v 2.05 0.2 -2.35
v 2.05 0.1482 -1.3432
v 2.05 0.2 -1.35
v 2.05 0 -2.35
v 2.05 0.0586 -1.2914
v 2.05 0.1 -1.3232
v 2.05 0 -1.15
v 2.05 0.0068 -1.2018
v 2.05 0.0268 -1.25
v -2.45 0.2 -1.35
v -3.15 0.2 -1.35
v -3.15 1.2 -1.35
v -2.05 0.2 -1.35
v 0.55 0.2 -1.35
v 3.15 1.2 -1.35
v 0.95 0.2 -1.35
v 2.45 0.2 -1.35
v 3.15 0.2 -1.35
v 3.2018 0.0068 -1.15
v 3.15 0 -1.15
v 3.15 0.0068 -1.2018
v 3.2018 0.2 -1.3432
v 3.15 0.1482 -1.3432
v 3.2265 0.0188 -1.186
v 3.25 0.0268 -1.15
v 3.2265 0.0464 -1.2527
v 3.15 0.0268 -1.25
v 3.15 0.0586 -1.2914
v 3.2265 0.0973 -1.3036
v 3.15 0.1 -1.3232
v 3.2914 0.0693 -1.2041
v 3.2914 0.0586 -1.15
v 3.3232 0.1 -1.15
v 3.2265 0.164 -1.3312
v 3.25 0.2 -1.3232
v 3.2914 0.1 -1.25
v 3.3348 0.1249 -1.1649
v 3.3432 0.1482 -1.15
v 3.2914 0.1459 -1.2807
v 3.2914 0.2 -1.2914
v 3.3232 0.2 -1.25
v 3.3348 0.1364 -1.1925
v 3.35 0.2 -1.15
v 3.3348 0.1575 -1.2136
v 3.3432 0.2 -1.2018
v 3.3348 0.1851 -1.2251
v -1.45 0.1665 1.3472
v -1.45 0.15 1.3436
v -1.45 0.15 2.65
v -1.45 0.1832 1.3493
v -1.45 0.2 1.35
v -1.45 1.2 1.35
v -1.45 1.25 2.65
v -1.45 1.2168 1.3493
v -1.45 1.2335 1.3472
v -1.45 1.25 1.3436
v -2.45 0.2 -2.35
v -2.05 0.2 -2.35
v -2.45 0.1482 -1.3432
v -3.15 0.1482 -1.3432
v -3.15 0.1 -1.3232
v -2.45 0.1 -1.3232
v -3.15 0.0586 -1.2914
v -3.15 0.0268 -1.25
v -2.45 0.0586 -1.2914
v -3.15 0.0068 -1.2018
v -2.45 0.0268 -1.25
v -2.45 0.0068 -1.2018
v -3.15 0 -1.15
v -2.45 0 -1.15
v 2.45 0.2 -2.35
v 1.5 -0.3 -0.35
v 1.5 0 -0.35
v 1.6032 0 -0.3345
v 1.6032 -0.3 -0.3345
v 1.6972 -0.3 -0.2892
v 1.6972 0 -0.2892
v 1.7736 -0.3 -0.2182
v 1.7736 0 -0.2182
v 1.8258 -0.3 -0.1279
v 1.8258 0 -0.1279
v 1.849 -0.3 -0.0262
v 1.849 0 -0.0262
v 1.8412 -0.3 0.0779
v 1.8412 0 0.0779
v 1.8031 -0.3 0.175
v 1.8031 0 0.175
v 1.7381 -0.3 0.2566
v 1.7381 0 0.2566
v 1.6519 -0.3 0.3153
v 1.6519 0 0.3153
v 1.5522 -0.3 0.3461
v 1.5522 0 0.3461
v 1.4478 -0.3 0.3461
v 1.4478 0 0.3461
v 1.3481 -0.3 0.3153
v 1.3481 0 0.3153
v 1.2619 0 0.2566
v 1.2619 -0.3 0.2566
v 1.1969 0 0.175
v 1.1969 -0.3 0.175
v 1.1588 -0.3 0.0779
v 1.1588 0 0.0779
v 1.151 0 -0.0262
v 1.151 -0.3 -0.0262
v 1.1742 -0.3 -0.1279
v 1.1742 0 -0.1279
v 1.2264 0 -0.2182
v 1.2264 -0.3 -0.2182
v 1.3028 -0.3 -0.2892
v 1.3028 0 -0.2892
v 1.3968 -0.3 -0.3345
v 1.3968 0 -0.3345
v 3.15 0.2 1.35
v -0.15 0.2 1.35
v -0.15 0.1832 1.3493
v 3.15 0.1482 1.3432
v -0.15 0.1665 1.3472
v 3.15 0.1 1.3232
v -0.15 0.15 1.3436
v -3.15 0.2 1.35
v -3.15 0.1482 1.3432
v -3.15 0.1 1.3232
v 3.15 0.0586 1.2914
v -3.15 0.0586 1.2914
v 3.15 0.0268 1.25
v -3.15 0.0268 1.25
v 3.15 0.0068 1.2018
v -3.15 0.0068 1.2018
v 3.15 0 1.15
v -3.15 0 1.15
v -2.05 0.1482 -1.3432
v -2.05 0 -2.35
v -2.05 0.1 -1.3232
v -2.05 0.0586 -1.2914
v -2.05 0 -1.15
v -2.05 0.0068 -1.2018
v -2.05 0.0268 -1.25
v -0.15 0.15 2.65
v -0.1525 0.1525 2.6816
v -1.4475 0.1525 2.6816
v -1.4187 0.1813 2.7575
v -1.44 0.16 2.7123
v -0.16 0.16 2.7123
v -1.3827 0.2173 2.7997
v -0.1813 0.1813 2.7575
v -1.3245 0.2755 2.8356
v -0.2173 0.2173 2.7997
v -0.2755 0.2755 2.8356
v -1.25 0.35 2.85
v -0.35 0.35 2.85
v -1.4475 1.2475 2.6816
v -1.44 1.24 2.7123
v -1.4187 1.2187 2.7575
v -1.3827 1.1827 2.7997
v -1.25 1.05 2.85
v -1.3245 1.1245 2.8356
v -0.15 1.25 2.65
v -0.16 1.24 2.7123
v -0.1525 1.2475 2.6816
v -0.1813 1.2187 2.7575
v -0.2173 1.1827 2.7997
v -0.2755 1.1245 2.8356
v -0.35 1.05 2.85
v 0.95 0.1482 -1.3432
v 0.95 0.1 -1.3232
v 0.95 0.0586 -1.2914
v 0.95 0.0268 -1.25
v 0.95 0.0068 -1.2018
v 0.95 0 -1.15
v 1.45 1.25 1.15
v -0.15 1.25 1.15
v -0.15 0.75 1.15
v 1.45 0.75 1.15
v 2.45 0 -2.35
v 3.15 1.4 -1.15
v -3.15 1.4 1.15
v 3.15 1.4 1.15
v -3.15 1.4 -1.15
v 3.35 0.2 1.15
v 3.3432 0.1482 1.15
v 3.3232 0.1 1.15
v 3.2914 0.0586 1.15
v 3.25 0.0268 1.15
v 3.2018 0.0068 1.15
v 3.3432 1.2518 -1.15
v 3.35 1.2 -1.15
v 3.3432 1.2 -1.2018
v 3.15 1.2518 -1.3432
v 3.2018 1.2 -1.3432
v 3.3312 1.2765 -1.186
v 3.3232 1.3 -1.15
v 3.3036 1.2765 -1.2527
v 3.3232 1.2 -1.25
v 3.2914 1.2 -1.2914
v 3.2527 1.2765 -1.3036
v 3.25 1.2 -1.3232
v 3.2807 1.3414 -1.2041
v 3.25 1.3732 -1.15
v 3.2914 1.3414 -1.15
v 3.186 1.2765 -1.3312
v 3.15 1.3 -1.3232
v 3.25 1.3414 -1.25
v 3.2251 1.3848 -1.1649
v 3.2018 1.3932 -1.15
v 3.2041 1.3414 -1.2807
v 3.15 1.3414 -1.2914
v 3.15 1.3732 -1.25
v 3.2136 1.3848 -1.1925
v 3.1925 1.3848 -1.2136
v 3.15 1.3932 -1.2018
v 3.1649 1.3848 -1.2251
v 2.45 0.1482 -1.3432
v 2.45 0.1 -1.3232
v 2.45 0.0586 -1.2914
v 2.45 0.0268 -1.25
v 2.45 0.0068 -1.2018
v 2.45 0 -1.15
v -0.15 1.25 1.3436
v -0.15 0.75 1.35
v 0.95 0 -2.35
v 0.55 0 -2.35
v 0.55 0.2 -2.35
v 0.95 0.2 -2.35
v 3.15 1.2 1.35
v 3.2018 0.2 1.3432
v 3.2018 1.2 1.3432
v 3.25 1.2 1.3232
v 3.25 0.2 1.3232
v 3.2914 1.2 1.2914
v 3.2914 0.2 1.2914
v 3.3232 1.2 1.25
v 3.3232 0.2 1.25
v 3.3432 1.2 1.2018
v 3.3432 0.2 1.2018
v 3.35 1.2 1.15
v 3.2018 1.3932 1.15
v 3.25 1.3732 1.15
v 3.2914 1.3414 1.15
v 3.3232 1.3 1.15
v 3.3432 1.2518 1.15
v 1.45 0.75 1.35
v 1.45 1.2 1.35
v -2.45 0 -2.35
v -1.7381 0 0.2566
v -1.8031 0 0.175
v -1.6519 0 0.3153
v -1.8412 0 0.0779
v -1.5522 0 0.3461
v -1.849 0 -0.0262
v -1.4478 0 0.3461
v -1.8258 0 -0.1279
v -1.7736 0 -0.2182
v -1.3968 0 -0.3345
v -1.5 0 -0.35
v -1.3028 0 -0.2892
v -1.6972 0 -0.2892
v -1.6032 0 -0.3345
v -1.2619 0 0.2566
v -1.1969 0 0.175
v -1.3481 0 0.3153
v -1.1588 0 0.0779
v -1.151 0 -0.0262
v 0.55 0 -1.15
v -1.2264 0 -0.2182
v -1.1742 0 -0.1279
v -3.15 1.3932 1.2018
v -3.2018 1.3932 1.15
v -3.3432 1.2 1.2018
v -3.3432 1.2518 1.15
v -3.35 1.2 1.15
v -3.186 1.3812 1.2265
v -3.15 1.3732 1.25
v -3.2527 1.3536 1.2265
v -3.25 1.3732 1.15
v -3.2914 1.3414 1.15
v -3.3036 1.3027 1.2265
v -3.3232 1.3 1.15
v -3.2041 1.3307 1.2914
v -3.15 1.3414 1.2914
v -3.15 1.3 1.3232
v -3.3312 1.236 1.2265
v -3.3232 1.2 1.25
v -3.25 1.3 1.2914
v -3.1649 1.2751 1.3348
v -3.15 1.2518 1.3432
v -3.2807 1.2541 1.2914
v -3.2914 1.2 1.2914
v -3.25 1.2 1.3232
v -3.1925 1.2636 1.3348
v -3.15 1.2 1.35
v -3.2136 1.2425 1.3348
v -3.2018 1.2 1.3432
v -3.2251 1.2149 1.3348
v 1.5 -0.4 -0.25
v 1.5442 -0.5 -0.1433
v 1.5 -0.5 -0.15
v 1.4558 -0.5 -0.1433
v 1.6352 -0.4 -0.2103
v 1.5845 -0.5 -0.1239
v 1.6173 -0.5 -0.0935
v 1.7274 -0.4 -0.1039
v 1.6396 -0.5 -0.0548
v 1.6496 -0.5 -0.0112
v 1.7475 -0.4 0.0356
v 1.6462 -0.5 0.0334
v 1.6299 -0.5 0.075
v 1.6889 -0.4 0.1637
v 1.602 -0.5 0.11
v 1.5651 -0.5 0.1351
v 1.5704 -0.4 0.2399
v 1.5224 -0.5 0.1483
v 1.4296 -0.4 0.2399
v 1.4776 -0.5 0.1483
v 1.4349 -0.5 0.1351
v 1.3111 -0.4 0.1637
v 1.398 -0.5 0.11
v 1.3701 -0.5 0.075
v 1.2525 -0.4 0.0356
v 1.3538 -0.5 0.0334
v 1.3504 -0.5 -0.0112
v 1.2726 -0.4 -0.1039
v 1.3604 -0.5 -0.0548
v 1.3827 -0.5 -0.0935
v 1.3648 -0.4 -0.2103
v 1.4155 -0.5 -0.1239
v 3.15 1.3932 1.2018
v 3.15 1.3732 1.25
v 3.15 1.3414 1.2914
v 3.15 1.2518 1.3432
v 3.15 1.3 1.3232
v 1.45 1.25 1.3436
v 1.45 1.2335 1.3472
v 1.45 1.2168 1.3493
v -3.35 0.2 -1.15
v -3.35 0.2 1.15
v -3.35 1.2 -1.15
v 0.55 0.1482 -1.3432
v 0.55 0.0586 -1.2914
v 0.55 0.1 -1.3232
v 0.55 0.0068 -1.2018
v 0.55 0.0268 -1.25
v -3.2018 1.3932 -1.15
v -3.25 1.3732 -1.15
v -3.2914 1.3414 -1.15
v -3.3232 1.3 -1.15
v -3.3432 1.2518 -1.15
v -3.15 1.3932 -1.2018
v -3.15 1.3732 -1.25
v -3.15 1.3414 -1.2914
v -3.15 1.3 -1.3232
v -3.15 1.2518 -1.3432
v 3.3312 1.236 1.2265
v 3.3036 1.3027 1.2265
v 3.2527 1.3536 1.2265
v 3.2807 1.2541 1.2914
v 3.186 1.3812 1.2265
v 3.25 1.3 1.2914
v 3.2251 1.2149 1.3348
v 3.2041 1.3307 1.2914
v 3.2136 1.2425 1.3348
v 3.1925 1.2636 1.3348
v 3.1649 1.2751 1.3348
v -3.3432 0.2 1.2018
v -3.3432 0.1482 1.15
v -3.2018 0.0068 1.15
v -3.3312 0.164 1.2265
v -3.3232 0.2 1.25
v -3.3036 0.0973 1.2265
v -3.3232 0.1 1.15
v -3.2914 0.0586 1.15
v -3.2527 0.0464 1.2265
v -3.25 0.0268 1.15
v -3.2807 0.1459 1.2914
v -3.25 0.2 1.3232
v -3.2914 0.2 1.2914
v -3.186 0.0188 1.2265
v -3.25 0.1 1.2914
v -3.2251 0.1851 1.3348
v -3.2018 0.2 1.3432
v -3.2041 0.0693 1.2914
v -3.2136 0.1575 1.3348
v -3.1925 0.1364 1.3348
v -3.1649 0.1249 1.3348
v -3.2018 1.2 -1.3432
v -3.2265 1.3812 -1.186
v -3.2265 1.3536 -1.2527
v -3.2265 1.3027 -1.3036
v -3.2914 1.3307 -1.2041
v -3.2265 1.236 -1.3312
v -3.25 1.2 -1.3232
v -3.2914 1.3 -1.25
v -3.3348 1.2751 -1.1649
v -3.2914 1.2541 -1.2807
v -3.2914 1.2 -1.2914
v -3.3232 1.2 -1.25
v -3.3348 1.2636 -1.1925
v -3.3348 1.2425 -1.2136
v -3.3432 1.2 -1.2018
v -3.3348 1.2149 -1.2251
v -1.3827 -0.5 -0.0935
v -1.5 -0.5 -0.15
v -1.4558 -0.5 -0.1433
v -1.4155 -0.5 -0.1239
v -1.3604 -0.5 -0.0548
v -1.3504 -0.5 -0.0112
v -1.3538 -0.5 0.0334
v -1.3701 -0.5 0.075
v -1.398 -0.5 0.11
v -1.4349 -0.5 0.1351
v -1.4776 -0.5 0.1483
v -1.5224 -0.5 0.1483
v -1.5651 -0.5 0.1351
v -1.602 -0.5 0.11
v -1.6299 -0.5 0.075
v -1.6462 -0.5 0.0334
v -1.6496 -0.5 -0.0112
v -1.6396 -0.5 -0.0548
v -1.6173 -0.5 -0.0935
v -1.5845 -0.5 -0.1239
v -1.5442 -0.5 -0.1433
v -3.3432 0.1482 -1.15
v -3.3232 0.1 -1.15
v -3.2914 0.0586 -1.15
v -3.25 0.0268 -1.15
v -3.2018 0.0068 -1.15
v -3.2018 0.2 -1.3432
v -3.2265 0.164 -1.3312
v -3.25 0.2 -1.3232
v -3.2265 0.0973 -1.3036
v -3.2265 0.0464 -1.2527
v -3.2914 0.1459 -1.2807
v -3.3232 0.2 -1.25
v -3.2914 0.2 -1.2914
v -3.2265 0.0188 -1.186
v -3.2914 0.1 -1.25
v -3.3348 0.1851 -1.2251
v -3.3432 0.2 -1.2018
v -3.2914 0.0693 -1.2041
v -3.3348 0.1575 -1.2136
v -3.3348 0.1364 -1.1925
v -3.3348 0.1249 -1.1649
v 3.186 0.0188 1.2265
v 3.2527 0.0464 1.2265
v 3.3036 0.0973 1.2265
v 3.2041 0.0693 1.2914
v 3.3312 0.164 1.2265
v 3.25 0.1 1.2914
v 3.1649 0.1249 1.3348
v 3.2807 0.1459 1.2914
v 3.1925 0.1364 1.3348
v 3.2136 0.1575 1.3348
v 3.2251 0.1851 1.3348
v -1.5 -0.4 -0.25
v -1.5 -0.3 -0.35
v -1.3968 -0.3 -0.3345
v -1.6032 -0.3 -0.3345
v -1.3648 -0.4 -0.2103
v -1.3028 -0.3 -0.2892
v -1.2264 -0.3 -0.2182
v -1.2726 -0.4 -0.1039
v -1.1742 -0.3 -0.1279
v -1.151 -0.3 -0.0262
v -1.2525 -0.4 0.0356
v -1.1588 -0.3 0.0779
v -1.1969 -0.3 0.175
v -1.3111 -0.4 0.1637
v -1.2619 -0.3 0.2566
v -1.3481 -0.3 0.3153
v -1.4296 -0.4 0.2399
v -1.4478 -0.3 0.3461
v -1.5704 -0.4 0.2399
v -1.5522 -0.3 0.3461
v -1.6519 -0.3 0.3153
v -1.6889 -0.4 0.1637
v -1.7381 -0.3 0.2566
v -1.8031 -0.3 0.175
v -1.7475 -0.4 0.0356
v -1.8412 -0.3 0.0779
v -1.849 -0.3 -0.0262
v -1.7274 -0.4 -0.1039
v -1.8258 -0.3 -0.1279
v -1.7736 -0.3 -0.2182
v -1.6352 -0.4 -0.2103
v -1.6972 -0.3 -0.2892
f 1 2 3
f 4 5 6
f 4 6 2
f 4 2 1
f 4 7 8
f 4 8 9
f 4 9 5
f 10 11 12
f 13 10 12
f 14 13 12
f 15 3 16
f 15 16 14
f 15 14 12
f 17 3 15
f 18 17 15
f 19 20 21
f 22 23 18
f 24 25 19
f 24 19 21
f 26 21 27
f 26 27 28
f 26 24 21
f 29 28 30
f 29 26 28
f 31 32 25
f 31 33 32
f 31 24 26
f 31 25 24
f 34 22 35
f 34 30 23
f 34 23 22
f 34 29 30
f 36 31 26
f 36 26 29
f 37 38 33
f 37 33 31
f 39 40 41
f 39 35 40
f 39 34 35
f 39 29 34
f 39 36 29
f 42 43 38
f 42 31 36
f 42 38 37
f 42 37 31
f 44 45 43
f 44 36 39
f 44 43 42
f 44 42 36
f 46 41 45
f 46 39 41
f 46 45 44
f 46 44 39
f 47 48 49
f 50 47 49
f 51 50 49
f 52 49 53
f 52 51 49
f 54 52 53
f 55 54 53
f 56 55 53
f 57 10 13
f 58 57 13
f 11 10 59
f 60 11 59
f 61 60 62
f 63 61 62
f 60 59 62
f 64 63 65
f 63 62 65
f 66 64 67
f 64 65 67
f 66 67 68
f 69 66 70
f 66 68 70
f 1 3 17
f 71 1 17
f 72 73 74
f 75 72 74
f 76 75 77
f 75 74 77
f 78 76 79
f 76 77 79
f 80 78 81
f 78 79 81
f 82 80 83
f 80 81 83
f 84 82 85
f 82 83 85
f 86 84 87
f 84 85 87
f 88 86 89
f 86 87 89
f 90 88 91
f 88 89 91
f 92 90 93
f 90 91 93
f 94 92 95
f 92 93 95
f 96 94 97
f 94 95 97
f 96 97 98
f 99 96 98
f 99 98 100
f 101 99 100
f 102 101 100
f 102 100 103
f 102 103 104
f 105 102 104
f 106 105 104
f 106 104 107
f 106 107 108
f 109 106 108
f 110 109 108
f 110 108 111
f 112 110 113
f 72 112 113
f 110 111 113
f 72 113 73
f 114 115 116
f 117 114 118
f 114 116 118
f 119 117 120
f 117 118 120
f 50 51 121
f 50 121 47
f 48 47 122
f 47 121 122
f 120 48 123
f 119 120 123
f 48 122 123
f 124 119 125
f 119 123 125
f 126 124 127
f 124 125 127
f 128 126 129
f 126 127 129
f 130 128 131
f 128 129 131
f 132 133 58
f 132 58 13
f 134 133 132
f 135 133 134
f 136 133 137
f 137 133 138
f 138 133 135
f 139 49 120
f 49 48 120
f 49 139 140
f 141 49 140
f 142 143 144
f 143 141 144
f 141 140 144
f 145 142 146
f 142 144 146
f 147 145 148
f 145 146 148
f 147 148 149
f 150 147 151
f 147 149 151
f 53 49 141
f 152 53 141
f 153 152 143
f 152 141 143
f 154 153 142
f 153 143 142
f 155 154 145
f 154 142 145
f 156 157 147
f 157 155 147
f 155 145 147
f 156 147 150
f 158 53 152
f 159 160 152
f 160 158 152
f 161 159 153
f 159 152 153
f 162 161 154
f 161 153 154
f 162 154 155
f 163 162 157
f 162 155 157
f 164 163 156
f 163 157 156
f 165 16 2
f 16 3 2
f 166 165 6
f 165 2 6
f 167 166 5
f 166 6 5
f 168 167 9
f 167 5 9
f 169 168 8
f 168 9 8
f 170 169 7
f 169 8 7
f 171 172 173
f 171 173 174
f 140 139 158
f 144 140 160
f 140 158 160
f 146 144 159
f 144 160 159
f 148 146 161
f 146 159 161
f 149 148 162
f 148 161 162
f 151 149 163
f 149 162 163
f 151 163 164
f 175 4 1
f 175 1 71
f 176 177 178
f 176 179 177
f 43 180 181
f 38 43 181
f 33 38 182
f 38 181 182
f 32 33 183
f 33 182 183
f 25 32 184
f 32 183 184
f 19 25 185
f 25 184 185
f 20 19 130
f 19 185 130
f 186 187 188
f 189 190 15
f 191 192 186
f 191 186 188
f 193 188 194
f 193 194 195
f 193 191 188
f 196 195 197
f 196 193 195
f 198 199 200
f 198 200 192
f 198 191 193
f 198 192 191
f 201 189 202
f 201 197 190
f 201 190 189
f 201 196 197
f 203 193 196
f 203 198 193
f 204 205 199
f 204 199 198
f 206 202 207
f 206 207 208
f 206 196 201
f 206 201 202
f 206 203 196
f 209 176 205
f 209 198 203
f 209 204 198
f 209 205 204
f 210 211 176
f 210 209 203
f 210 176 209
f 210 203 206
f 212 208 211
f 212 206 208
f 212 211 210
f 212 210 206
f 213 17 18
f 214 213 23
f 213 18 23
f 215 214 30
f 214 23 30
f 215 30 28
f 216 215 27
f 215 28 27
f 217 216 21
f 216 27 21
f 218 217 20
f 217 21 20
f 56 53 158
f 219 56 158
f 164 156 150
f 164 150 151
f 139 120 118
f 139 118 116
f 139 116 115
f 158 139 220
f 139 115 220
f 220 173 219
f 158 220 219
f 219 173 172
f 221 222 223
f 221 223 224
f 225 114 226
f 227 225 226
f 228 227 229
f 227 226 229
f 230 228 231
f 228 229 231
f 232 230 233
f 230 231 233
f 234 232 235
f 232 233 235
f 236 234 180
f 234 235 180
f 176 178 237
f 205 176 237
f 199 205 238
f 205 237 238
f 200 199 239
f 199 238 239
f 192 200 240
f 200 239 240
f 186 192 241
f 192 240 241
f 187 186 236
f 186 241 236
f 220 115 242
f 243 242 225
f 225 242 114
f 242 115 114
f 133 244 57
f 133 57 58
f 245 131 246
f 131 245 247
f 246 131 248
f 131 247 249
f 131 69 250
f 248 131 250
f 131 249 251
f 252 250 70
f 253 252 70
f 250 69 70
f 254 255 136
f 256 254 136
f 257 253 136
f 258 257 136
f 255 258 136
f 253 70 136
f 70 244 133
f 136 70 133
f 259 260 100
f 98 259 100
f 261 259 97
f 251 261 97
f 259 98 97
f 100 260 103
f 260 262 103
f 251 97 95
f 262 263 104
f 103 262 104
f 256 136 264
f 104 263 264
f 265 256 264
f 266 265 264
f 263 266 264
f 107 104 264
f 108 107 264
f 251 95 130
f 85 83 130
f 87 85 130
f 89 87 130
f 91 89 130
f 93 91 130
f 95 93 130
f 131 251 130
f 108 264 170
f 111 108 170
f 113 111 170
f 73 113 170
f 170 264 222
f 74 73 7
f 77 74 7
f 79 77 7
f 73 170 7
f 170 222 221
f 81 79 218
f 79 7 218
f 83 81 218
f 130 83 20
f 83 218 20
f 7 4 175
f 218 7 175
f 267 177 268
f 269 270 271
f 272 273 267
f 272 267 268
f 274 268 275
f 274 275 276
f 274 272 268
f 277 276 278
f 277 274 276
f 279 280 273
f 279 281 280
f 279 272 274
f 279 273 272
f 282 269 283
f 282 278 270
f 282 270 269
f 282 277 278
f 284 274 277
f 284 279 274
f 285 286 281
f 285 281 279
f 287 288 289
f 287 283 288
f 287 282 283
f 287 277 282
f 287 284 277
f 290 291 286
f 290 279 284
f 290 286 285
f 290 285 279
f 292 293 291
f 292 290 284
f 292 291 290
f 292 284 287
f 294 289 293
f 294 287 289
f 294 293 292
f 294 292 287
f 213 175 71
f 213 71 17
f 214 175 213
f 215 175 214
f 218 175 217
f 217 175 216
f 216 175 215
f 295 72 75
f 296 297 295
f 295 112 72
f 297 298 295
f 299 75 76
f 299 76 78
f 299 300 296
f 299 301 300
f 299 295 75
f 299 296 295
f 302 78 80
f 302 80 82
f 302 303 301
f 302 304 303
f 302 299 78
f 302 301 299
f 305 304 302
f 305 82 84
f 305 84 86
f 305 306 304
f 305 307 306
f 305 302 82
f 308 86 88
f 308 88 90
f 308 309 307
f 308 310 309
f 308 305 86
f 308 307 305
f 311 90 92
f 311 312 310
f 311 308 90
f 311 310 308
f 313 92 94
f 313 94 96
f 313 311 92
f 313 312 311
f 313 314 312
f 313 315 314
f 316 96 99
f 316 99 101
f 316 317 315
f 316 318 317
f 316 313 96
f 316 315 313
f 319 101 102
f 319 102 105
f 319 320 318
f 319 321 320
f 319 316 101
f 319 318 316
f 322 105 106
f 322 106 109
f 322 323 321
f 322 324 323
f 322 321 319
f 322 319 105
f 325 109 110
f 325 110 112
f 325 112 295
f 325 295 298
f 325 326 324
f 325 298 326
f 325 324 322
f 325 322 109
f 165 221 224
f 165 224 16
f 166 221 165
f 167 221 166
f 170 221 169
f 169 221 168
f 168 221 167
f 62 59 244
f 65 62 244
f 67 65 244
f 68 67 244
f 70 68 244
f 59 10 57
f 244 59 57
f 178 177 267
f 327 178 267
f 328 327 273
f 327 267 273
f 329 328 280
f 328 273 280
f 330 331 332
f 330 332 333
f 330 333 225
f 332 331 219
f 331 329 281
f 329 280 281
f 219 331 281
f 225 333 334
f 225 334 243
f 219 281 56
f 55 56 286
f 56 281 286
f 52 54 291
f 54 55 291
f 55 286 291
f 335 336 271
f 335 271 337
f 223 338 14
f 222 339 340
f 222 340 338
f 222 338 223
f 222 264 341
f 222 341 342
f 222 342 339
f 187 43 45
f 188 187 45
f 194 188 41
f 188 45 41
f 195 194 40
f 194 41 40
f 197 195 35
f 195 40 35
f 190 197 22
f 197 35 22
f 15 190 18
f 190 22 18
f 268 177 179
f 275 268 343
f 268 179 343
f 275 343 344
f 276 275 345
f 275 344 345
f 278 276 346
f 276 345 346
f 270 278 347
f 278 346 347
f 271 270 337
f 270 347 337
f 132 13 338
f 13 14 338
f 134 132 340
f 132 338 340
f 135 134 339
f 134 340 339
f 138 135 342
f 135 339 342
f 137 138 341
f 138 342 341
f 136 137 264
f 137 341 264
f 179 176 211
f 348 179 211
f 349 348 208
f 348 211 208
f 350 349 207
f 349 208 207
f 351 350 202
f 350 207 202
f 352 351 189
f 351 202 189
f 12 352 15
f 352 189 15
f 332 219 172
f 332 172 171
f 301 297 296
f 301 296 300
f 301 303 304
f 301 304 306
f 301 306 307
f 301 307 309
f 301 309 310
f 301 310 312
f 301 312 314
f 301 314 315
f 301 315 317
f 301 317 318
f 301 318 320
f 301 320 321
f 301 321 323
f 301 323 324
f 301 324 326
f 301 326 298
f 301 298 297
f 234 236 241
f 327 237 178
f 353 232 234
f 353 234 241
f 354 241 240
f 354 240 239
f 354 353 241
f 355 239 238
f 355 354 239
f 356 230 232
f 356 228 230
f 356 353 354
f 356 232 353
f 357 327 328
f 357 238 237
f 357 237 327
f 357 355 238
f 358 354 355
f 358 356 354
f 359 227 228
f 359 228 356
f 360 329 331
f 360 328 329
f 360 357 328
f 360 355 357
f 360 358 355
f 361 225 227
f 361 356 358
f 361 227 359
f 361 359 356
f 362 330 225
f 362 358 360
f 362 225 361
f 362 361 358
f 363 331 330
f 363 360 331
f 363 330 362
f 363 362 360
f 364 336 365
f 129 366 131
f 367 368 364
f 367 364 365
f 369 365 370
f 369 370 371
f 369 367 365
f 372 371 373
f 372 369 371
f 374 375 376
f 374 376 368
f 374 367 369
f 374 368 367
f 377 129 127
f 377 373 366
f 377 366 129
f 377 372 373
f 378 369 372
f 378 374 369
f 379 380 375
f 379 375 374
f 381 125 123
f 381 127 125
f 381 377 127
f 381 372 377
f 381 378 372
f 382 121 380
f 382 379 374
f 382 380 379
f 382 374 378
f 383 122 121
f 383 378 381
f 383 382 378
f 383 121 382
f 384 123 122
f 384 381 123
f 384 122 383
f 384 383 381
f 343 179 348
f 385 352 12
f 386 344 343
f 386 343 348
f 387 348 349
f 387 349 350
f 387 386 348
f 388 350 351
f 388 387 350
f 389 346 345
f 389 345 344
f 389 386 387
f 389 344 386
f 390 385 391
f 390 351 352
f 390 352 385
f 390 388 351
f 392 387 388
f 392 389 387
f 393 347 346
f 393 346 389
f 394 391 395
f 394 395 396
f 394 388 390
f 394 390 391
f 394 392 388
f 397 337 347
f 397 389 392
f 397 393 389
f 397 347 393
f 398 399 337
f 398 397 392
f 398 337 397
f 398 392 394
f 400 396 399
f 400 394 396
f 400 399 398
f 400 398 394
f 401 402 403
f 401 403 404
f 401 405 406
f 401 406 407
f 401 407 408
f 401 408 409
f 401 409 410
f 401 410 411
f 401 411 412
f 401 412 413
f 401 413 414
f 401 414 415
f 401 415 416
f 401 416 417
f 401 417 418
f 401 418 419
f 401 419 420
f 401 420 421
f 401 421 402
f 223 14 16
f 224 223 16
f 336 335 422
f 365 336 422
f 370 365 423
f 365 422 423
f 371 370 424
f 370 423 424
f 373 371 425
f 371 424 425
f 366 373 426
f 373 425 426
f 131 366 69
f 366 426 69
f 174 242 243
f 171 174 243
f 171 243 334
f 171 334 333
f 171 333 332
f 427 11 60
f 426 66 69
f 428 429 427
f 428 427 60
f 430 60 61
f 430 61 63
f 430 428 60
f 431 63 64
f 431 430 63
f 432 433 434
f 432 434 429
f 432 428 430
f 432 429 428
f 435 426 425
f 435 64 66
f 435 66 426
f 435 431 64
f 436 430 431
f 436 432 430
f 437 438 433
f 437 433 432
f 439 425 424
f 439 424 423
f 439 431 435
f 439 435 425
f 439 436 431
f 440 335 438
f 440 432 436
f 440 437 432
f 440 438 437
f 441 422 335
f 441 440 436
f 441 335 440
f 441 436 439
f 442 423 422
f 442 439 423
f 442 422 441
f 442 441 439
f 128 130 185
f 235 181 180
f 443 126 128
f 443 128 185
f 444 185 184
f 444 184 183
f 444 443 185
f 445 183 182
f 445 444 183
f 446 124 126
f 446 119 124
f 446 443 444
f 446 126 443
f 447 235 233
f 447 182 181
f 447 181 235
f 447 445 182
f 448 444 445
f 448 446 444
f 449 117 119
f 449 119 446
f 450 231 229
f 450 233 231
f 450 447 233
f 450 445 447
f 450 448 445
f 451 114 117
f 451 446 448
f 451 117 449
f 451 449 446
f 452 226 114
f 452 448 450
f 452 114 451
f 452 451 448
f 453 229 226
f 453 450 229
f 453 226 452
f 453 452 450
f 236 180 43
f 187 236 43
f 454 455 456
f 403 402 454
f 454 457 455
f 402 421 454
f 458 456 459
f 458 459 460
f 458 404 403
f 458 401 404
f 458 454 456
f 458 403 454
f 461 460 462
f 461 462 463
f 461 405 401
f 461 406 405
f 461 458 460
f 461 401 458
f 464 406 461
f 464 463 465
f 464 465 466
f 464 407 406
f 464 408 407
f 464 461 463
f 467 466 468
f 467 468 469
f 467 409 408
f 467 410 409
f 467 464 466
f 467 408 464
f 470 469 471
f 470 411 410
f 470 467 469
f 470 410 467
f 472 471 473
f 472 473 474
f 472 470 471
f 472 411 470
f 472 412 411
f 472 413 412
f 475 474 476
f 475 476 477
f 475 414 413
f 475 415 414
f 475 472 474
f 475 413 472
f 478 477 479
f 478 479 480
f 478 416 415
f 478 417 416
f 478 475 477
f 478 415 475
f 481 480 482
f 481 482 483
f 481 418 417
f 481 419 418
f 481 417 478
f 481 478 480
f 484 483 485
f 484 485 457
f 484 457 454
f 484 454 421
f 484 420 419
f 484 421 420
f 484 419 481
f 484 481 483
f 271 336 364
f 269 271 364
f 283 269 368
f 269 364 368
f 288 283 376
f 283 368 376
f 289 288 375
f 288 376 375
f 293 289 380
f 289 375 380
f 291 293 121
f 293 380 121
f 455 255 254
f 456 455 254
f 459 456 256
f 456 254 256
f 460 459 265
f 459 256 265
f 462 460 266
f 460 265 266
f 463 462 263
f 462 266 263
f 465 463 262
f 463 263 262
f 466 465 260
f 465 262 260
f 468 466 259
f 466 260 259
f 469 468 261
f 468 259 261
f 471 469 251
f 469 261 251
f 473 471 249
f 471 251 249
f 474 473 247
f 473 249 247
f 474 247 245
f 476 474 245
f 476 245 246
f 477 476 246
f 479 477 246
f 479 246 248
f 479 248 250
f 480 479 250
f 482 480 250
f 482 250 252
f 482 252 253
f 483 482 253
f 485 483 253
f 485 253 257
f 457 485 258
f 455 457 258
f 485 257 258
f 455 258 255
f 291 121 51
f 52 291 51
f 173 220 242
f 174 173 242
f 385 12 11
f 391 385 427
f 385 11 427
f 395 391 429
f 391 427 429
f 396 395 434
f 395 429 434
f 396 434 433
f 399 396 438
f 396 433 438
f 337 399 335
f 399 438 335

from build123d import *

# Parameters (mm, degrees)
SKETCH_1_W          = 6.7
SKETCH_1_H          = 2.7
EXTRUDE_1_DEPTH     = 1.4
SKETCH_2_W          = 2.9
SKETCH_2_H          = 0.5
CUT_EXTRUDE_1_DEPTH = 0.2
SKETCH_3_W          = 1.3
SKETCH_3_H          = 1.1
EXTRUDE_2_DEPTH     = 1.7
SKETCH_4_W          = 0.4
SKETCH_4_H          = 1
EXTRUDE_3_DEPTH     = 0.2
SKETCH_6_R          = 0.35
EXTRUDE_4_DEPTH     = 0.5
FILLET_1_R          = 0.2
CHAMFER_1_SIZE      = 0.2


with BuildPart() as part:
    # Эскиз1 → Бобышка-Вытянуть1 (new body)
    with BuildSketch(Plane(origin=(0, 0, 0), x_dir=(1, 0, 0), z_dir=(0, 1, 0))):
        Rectangle(SKETCH_1_W, SKETCH_1_H)
    extrude(amount=EXTRUDE_1_DEPTH)

    # Эскиз2 → Вырез-Вытянуть1 (cut)
    with BuildSketch(Plane.XY.offset(1.35)):
        with Locations((0, 1)):
            Rectangle(SKETCH_2_W, SKETCH_2_H)
    extrude(amount=-CUT_EXTRUDE_1_DEPTH, mode=Mode.SUBTRACT)

    # Эскиз3 → Бобышка-Вытянуть2 (add)
    with BuildSketch(Plane.XY.offset(1.15)):
        with Locations((-0.8, 0.7)):
            Rectangle(SKETCH_3_W, SKETCH_3_H)
    extrude(amount=EXTRUDE_2_DEPTH)

    # Эскиз4 → Бобышка-Вытянуть3 (add)
    with BuildSketch(Plane.XZ):
        with Locations((-2.25, -1.85)):
            Rectangle(SKETCH_4_W, SKETCH_4_H)
        with Locations((0.75, -1.85)):
            Rectangle(SKETCH_4_W, SKETCH_4_H)
        with Locations((2.25, -1.85)):
            Rectangle(SKETCH_4_W, SKETCH_4_H)
    extrude(amount=-EXTRUDE_3_DEPTH)

    # Эскиз6 → Бобышка-Вытянуть4 (add)
    with BuildSketch(Plane.XZ):
        with Locations(Location((-1.5, 0, 0), (0, 0, 270))):
            Circle(SKETCH_6_R)
        with Locations(Location((1.5, 0, 0), (0, 0, 270))):
            Circle(SKETCH_6_R)
    extrude(amount=EXTRUDE_4_DEPTH)

    # Скругление1
    # the kernel refuses this fillet: 0.2 mm, written as the material it takes off along each edge
    with BuildSketch(Plane(origin=(3.15, 0.2, 1.15), x_dir=(1, 0, 0), z_dir=(0, 0, 1))) as fillet_1_piece_1_section:
        Polygon((0, 0), (FILLET_1_R * 1.02, 0), (FILLET_1_R * 1.02, -FILLET_1_R * 1.02), (0, -FILLET_1_R * 1.02), align=None)
    fillet_1_piece_1 = extrude(amount=FILLET_1_R * 1.02, mode=Mode.PRIVATE)
    fillet_1_piece_1 = fillet_1_piece_1 - Plane(origin=(3.15, 0.2, 1.15), x_dir=(-0.7071067811865475, 0.7071067811865475, 0), z_dir=(0, 0, 1)) * Sphere(FILLET_1_R, mode=Mode.PRIVATE)
    add(fillet_1_piece_1, mode=Mode.SUBTRACT)
    with BuildSketch(Plane(origin=(3.15, 1.2, 1.15), x_dir=(0, 1, 0), z_dir=(0, 0, 1))) as fillet_1_piece_2_section:
        Polygon((0, 0), (FILLET_1_R * 1.02, 0), (FILLET_1_R * 1.02, -FILLET_1_R * 1.02), (0, -FILLET_1_R * 1.02), align=None)
    fillet_1_piece_2 = extrude(amount=FILLET_1_R * 1.02, mode=Mode.PRIVATE)
    fillet_1_piece_2 = fillet_1_piece_2 - Plane(origin=(3.15, 1.2, 1.15), x_dir=(-0.7071067811865475, -0.7071067811865475, 0), z_dir=(0, 0, 1)) * Sphere(FILLET_1_R, mode=Mode.PRIVATE)
    add(fillet_1_piece_2, mode=Mode.SUBTRACT)
    with BuildSketch(Plane(origin=(3.15, 1.2, -1.15), x_dir=(1, 0, 0), z_dir=(0, 1, 0))) as fillet_1_piece_3_section:
        Polygon((0, 0), (FILLET_1_R * 1.02, 0), (FILLET_1_R * 1.02, FILLET_1_R * 1.02), (0, FILLET_1_R * 1.02), align=None)
    fillet_1_piece_3 = extrude(amount=FILLET_1_R * 1.02, mode=Mode.PRIVATE)
    fillet_1_piece_3 = fillet_1_piece_3 - Plane(origin=(3.15, 1.2, -1.15), x_dir=(-0.7071067811865475, 0, 0.7071067811865475), z_dir=(0, 1, 0)) * Sphere(FILLET_1_R, mode=Mode.PRIVATE)
    add(fillet_1_piece_3, mode=Mode.SUBTRACT)
    with BuildSketch(Plane(origin=(3.15, 0.2, -1.15), x_dir=(0, 0, -1), z_dir=(1, 0, 0))) as fillet_1_piece_4_section:
        Polygon((0, 0), (FILLET_1_R * 1.02, 0), (FILLET_1_R * 1.02, -FILLET_1_R * 1.02), (0, -FILLET_1_R * 1.02), align=None)
    fillet_1_piece_4 = extrude(amount=FILLET_1_R * 1.02, mode=Mode.PRIVATE)
    fillet_1_piece_4 = fillet_1_piece_4 - Plane(origin=(3.15, 0.2, -1.15), x_dir=(0, 0.7071067811865475, 0.7071067811865475), z_dir=(1, 0, 0)) * Sphere(FILLET_1_R, mode=Mode.PRIVATE)
    add(fillet_1_piece_4, mode=Mode.SUBTRACT)
    with BuildSketch(Plane(origin=(-3.15, 0.2, -1.15), x_dir=(0, 0, -1), z_dir=(-1, 0, 0))) as fillet_1_piece_5_section:
        Polygon((0, 0), (FILLET_1_R * 1.02, 0), (FILLET_1_R * 1.02, FILLET_1_R * 1.02), (0, FILLET_1_R * 1.02), align=None)
    fillet_1_piece_5 = extrude(amount=FILLET_1_R * 1.02, mode=Mode.PRIVATE)
    fillet_1_piece_5 = fillet_1_piece_5 - Plane(origin=(-3.15, 0.2, -1.15), x_dir=(0, 0.7071067811865475, 0.7071067811865475), z_dir=(-1, 0, 0)) * Sphere(FILLET_1_R, mode=Mode.PRIVATE)
    add(fillet_1_piece_5, mode=Mode.SUBTRACT)
    with BuildSketch(Plane(origin=(-3.15, 1.2, -1.15), x_dir=(0, 1, 0), z_dir=(-1, 0, 0))) as fillet_1_piece_6_section:
        Polygon((0, 0), (FILLET_1_R * 1.02, 0), (FILLET_1_R * 1.02, FILLET_1_R * 1.02), (0, FILLET_1_R * 1.02), align=None)
    fillet_1_piece_6 = extrude(amount=FILLET_1_R * 1.02, mode=Mode.PRIVATE)
    fillet_1_piece_6 = fillet_1_piece_6 - Plane(origin=(-3.15, 1.2, -1.15), x_dir=(0, -0.7071067811865475, 0.7071067811865475), z_dir=(-1, 0, 0)) * Sphere(FILLET_1_R, mode=Mode.PRIVATE)
    add(fillet_1_piece_6, mode=Mode.SUBTRACT)
    with BuildSketch(Plane(origin=(-3.15, 1.2, 1.15), x_dir=(-1, 0, 0), z_dir=(0, 0, 1))) as fillet_1_piece_7_section:
        Polygon((0, 0), (FILLET_1_R * 1.02, 0), (FILLET_1_R * 1.02, -FILLET_1_R * 1.02), (0, -FILLET_1_R * 1.02), align=None)
    fillet_1_piece_7 = extrude(amount=FILLET_1_R * 1.02, mode=Mode.PRIVATE)
    fillet_1_piece_7 = fillet_1_piece_7 - Plane(origin=(-3.15, 1.2, 1.15), x_dir=(0.7071067811865475, -0.7071067811865475, 0), z_dir=(0, 0, 1)) * Sphere(FILLET_1_R, mode=Mode.PRIVATE)
    add(fillet_1_piece_7, mode=Mode.SUBTRACT)
    with BuildSketch(Plane(origin=(-3.15, 0.2, 1.15), x_dir=(-1, 0, 0), z_dir=(0, 0, 1))) as fillet_1_piece_8_section:
        Polygon((0, 0), (FILLET_1_R * 1.02, 0), (FILLET_1_R * 1.02, FILLET_1_R * 1.02), (0, FILLET_1_R * 1.02), align=None)
    fillet_1_piece_8 = extrude(amount=FILLET_1_R * 1.02, mode=Mode.PRIVATE)
    fillet_1_piece_8 = fillet_1_piece_8 - Plane(origin=(-3.15, 0.2, 1.15), x_dir=(0.7071067811865475, 0.7071067811865475, 0), z_dir=(0, 0, 1)) * Sphere(FILLET_1_R, mode=Mode.PRIVATE)
    add(fillet_1_piece_8, mode=Mode.SUBTRACT)
    with BuildSketch(Plane(origin=(3.35, 0.2, 1.35), x_dir=(-1, 0, 0), z_dir=(0, 1, 0)), Plane(origin=(3.35, 0.2, -1.35), x_dir=(0, 0, 1), z_dir=(0, 1, 0))) as fillet_1_piece_9:
        with BuildLine():
            CenterArc((FILLET_1_R, -FILLET_1_R), FILLET_1_R, 90, 90)
            Line((0, -FILLET_1_R), (0, 0))
            Line((0, 0), (FILLET_1_R, 0))
        make_face()
    extrude(amount=1, mode=Mode.SUBTRACT)
    with BuildSketch(Plane(origin=(3.35, 1.4, 1.15), x_dir=(-1, 0, 0), z_dir=(0, 0, -1)), Plane(origin=(3.35, 0, 1.15), x_dir=(0, 1, 0), z_dir=(0, 0, -1)), Plane(origin=(-3.35, 0, -1.15), x_dir=(0, 1, 0), z_dir=(0, 0, 1)), Plane(origin=(-1.95, 1.25, 2.85), x_dir=(0, 0, -1), z_dir=(1, 0, 0)), Plane(origin=(0.35, 0.15, 2.85), x_dir=(0, 0, -1), z_dir=(-1, 0, 0))) as fillet_1_piece_10:
        with BuildLine():
            CenterArc((FILLET_1_R, -FILLET_1_R), FILLET_1_R, 90, 90)
            Line((0, -FILLET_1_R), (0, 0))
            Line((0, 0), (FILLET_1_R, 0))
        make_face()
    extrude(amount=2.3, mode=Mode.SUBTRACT)
    with BuildSketch(Plane(origin=(-3.35, 0.2, -1.35), x_dir=(0, 0, 1), z_dir=(0, 1, 0)), Plane(origin=(-3.35, 0.2, 1.35), x_dir=(1, 0, 0), z_dir=(0, 1, 0))) as fillet_1_piece_11:
        with BuildLine():
            CenterArc((FILLET_1_R, FILLET_1_R), FILLET_1_R, 180, 90)
            Line((0, FILLET_1_R), (0, 0))
            Line((0, 0), (FILLET_1_R, 0))
        make_face()
    extrude(amount=1, mode=Mode.SUBTRACT)
    with BuildSketch(Plane(origin=(-3.35, 1.4, -1.15), x_dir=(0, -1, 0), z_dir=(0, 0, 1))) as fillet_1_piece_12:
        with BuildLine():
            CenterArc((FILLET_1_R, FILLET_1_R), FILLET_1_R, 180, 90)
            Line((0, FILLET_1_R), (0, 0))
            Line((0, 0), (FILLET_1_R, 0))
        make_face()
    extrude(amount=2.3, mode=Mode.SUBTRACT)
    with BuildSketch(Plane(origin=(3.15, 0, -1.35), x_dir=(0, 0, 1), z_dir=(-1, 0, 0)), Plane(origin=(-2.45, 0, -1.35), x_dir=(0, 0, 1), z_dir=(-1, 0, 0))) as fillet_1_piece_13:
        with BuildLine():
            CenterArc((FILLET_1_R, FILLET_1_R), FILLET_1_R, 180, 90)
            Line((0, FILLET_1_R), (0, 0))
            Line((0, 0), (FILLET_1_R, 0))
        make_face()
    extrude(amount=0.7, mode=Mode.SUBTRACT)
    with BuildSketch(Plane(origin=(3.15, 0, -1.35), x_dir=(0, 0, 1), z_dir=(-1, 0, 0))) as fillet_1_piece_14_section:
        with BuildLine():
            CenterArc((FILLET_1_R, FILLET_1_R), FILLET_1_R, 180, 90)
            Line((0, FILLET_1_R), (0, 0))
            Line((0, 0), (FILLET_1_R, 0))
        make_face()
    fillet_1_piece_14 = extrude(amount=1.2, mode=Mode.PRIVATE)
    fillet_1_piece_14 = split(fillet_1_piece_14, bisect_by=Plane(origin=(2.05, 0.044673588, -1.305326412), z_dir=(-1, 0, 0)), keep=Keep.TOP, mode=Mode.PRIVATE)
    add(fillet_1_piece_14, mode=Mode.SUBTRACT)
    with BuildSketch(Plane(origin=(2.55, 0, -1.35), x_dir=(0, 0, 1), z_dir=(-1, 0, 0))) as fillet_1_piece_15_section:
        with BuildLine():
            CenterArc((FILLET_1_R, FILLET_1_R), FILLET_1_R, 180, 90)
            Line((0, FILLET_1_R), (0, 0))
            Line((0, 0), (FILLET_1_R, 0))
        make_face()
    fillet_1_piece_15 = extrude(amount=2.1, mode=Mode.PRIVATE)
    fillet_1_piece_15 = split(fillet_1_piece_15, bisect_by=Plane(origin=(2.45, 0.044673588, -1.305326412), z_dir=(1, 0, 0)), keep=Keep.TOP, mode=Mode.PRIVATE)
    add(fillet_1_piece_15, mode=Mode.SUBTRACT)
    with BuildSketch(Plane(origin=(2.05, 0, -1.35), x_dir=(0, 0, 1), z_dir=(-1, 0, 0))) as fillet_1_piece_16:
        with BuildLine():
            CenterArc((FILLET_1_R, FILLET_1_R), FILLET_1_R, 180, 90)
            Line((0, FILLET_1_R), (0, 0))
            Line((0, 0), (FILLET_1_R, 0))
        make_face()
    extrude(amount=1.1, mode=Mode.SUBTRACT)
    with BuildSketch(Plane(origin=(2.55, 0, -1.35), x_dir=(0, 0, 1), z_dir=(-1, 0, 0))) as fillet_1_piece_17_section:
        with BuildLine():
            CenterArc((FILLET_1_R, FILLET_1_R), FILLET_1_R, 180, 90)
            Line((0, FILLET_1_R), (0, 0))
            Line((0, 0), (FILLET_1_R, 0))
        make_face()
    fillet_1_piece_17 = extrude(amount=2.1, mode=Mode.PRIVATE)
    fillet_1_piece_17 = split(fillet_1_piece_17, bisect_by=Plane(origin=(0.55, 0.044673588, -1.305326412), z_dir=(-1, 0, 0)), keep=Keep.TOP, mode=Mode.PRIVATE)
    add(fillet_1_piece_17, mode=Mode.SUBTRACT)
    with BuildSketch(Plane(origin=(1.05, 0, -1.35), x_dir=(0, 0, 1), z_dir=(-1, 0, 0))) as fillet_1_piece_18_section:
        with BuildLine():
            CenterArc((FILLET_1_R, FILLET_1_R), FILLET_1_R, 180, 90)
            Line((0, FILLET_1_R), (0, 0))
            Line((0, 0), (FILLET_1_R, 0))
        make_face()
    fillet_1_piece_18 = extrude(amount=3.6, mode=Mode.PRIVATE)
    fillet_1_piece_18 = split(fillet_1_piece_18, bisect_by=Plane(origin=(0.95, 0.044673588, -1.305326412), z_dir=(1, 0, 0)), keep=Keep.TOP, mode=Mode.PRIVATE)
    add(fillet_1_piece_18, mode=Mode.SUBTRACT)
    with BuildSketch(Plane(origin=(0.55, 0, -1.35), x_dir=(0, 0, 1), z_dir=(-1, 0, 0))) as fillet_1_piece_19:
        with BuildLine():
            CenterArc((FILLET_1_R, FILLET_1_R), FILLET_1_R, 180, 90)
            Line((0, FILLET_1_R), (0, 0))
            Line((0, 0), (FILLET_1_R, 0))
        make_face()
    extrude(amount=2.6, mode=Mode.SUBTRACT)
    with BuildSketch(Plane(origin=(1.05, 0, -1.35), x_dir=(0, 0, 1), z_dir=(-1, 0, 0))) as fillet_1_piece_20_section:
        with BuildLine():
            CenterArc((FILLET_1_R, FILLET_1_R), FILLET_1_R, 180, 90)
            Line((0, FILLET_1_R), (0, 0))
            Line((0, 0), (FILLET_1_R, 0))
        make_face()
    fillet_1_piece_20 = extrude(amount=3.6, mode=Mode.PRIVATE)
    fillet_1_piece_20 = split(fillet_1_piece_20, bisect_by=Plane(origin=(-2.45, 0.044673588, -1.305326412), z_dir=(-1, 0, 0)), keep=Keep.TOP, mode=Mode.PRIVATE)
    add(fillet_1_piece_20, mode=Mode.SUBTRACT)
    with BuildSketch(Plane(origin=(-1.95, 0, -1.35), x_dir=(0, 0, 1), z_dir=(-1, 0, 0))) as fillet_1_piece_21_section:
        with BuildLine():
            CenterArc((FILLET_1_R, FILLET_1_R), FILLET_1_R, 180, 90)
            Line((0, FILLET_1_R), (0, 0))
            Line((0, 0), (FILLET_1_R, 0))
        make_face()
    fillet_1_piece_21 = extrude(amount=1.2, mode=Mode.PRIVATE)
    fillet_1_piece_21 = split(fillet_1_piece_21, bisect_by=Plane(origin=(-2.05, 0.044673588, -1.305326412), z_dir=(1, 0, 0)), keep=Keep.TOP, mode=Mode.PRIVATE)
    add(fillet_1_piece_21, mode=Mode.SUBTRACT)
    with BuildSketch(Plane(origin=(3.15, 1.4, -1.35), x_dir=(0, 0, 1), z_dir=(-1, 0, 0))) as fillet_1_piece_22:
        with BuildLine():
            CenterArc((FILLET_1_R, -FILLET_1_R), FILLET_1_R, 90, 90)
            Line((0, -FILLET_1_R), (0, 0))
            Line((0, 0), (FILLET_1_R, 0))
        make_face()
    extrude(amount=6.3, mode=Mode.SUBTRACT)
    with BuildSketch(Plane(origin=(-3.15, 1.4, 1.35), x_dir=(0, -1, 0), z_dir=(1, 0, 0))) as fillet_1_piece_23_section:
        with BuildLine():
            CenterArc((FILLET_1_R, FILLET_1_R), FILLET_1_R, 180, 90)
            Line((0, FILLET_1_R), (0, 0))
            Line((0, 0), (FILLET_1_R, 0))
        make_face()
    fillet_1_piece_23 = extrude(amount=6.3, mode=Mode.PRIVATE)
    fillet_1_piece_23 = split(fillet_1_piece_23, bisect_by=Plane(origin=(-1.45, 1.237540036, 1.34810005), z_dir=(-1, 0, 0)), keep=Keep.TOP, mode=Mode.PRIVATE)
    add(fillet_1_piece_23, mode=Mode.SUBTRACT)
    with BuildSketch(Plane(origin=(-3.15, 1.4, 1.35), x_dir=(0, -1, 0), z_dir=(1, 0, 0))) as fillet_1_piece_24_section:
        with BuildLine():
            CenterArc((FILLET_1_R, FILLET_1_R), FILLET_1_R, 180, 90)
            Line((0, FILLET_1_R), (0, 0))
            Line((0, 0), (FILLET_1_R, 0))
        make_face()
    fillet_1_piece_24 = extrude(amount=6.3, mode=Mode.PRIVATE)
    fillet_1_piece_24 = split(fillet_1_piece_24, bisect_by=Plane(origin=(-0.8, 1.25, 1.304795882), z_dir=(0, 1, 0)), keep=Keep.TOP, mode=Mode.PRIVATE)
    add(fillet_1_piece_24, mode=Mode.SUBTRACT)
    with BuildSketch(Plane(origin=(-3.15, 1.4, 1.35), x_dir=(0, -1, 0), z_dir=(1, 0, 0))) as fillet_1_piece_25_section:
        with BuildLine():
            CenterArc((FILLET_1_R, FILLET_1_R), FILLET_1_R, 180, 90)
            Line((0, FILLET_1_R), (0, 0))
            Line((0, 0), (FILLET_1_R, 0))
        make_face()
    fillet_1_piece_25 = extrude(amount=6.3, mode=Mode.PRIVATE)
    fillet_1_piece_25 = split(fillet_1_piece_25, bisect_by=Plane(origin=(-0.15, 1.237540036, 1.34810005), z_dir=(1, 0, 0)), keep=Keep.TOP, mode=Mode.PRIVATE)
    add(fillet_1_piece_25, mode=Mode.SUBTRACT)
    with BuildSketch(Plane(origin=(-3.15, 0, 1.35), x_dir=(0, 1, 0), z_dir=(1, 0, 0))) as fillet_1_piece_26_section:
        with BuildLine():
            CenterArc((FILLET_1_R, -FILLET_1_R), FILLET_1_R, 90, 90)
            Line((0, -FILLET_1_R), (0, 0))
            Line((0, 0), (FILLET_1_R, 0))
        make_face()
    fillet_1_piece_26 = extrude(amount=6.3, mode=Mode.PRIVATE)
    fillet_1_piece_26 = split(fillet_1_piece_26, bisect_by=Plane(origin=(-1.45, 0.162459964, 1.34810005), z_dir=(-1, 0, 0)), keep=Keep.TOP, mode=Mode.PRIVATE)
    add(fillet_1_piece_26, mode=Mode.SUBTRACT)
    with BuildSketch(Plane(origin=(-3.15, 0, 1.35), x_dir=(0, 1, 0), z_dir=(1, 0, 0))) as fillet_1_piece_27_section:
        with BuildLine():
            CenterArc((FILLET_1_R, -FILLET_1_R), FILLET_1_R, 90, 90)
            Line((0, -FILLET_1_R), (0, 0))
            Line((0, 0), (FILLET_1_R, 0))
        make_face()
    fillet_1_piece_27 = extrude(amount=6.3, mode=Mode.PRIVATE)
    fillet_1_piece_27 = split(fillet_1_piece_27, bisect_by=Plane(origin=(-0.8, 0.15, 1.304795882), z_dir=(0, -1, 0)), keep=Keep.TOP, mode=Mode.PRIVATE)
    add(fillet_1_piece_27, mode=Mode.SUBTRACT)
    with BuildSketch(Plane(origin=(-3.15, 0, 1.35), x_dir=(0, 1, 0), z_dir=(1, 0, 0))) as fillet_1_piece_28_section:
        with BuildLine():
            CenterArc((FILLET_1_R, -FILLET_1_R), FILLET_1_R, 90, 90)
            Line((0, -FILLET_1_R), (0, 0))
            Line((0, 0), (FILLET_1_R, 0))
        make_face()
    fillet_1_piece_28 = extrude(amount=6.3, mode=Mode.PRIVATE)
    fillet_1_piece_28 = split(fillet_1_piece_28, bisect_by=Plane(origin=(-0.15, 0.162459964, 1.34810005), z_dir=(1, 0, 0)), keep=Keep.TOP, mode=Mode.PRIVATE)
    add(fillet_1_piece_28, mode=Mode.SUBTRACT)
    with BuildSketch(Plane(origin=(-0.15, 1.75, 2.85), x_dir=(0, 0, -1), z_dir=(0, -1, 0)), Plane(origin=(-1.45, -0.35, 2.85), x_dir=(0, 0, -1), z_dir=(0, 1, 0))) as fillet_1_piece_29:
        with BuildLine():
            CenterArc((FILLET_1_R, -FILLET_1_R), FILLET_1_R, 90, 90)
            Line((0, -FILLET_1_R), (0, 0))
            Line((0, 0), (FILLET_1_R, 0))
        make_face()
    extrude(amount=2.1, mode=Mode.SUBTRACT)

    # Фаска1
    chamfer_1_edges = [part.edges().sort_by_distance(p)[0] for p in [
        (-1.5, -0.5, 0.35),
        (1.5, -0.5, 0.35),
    ]]
    chamfer(chamfer_1_edges, length=CHAMFER_1_SIZE)


solid = part.part
